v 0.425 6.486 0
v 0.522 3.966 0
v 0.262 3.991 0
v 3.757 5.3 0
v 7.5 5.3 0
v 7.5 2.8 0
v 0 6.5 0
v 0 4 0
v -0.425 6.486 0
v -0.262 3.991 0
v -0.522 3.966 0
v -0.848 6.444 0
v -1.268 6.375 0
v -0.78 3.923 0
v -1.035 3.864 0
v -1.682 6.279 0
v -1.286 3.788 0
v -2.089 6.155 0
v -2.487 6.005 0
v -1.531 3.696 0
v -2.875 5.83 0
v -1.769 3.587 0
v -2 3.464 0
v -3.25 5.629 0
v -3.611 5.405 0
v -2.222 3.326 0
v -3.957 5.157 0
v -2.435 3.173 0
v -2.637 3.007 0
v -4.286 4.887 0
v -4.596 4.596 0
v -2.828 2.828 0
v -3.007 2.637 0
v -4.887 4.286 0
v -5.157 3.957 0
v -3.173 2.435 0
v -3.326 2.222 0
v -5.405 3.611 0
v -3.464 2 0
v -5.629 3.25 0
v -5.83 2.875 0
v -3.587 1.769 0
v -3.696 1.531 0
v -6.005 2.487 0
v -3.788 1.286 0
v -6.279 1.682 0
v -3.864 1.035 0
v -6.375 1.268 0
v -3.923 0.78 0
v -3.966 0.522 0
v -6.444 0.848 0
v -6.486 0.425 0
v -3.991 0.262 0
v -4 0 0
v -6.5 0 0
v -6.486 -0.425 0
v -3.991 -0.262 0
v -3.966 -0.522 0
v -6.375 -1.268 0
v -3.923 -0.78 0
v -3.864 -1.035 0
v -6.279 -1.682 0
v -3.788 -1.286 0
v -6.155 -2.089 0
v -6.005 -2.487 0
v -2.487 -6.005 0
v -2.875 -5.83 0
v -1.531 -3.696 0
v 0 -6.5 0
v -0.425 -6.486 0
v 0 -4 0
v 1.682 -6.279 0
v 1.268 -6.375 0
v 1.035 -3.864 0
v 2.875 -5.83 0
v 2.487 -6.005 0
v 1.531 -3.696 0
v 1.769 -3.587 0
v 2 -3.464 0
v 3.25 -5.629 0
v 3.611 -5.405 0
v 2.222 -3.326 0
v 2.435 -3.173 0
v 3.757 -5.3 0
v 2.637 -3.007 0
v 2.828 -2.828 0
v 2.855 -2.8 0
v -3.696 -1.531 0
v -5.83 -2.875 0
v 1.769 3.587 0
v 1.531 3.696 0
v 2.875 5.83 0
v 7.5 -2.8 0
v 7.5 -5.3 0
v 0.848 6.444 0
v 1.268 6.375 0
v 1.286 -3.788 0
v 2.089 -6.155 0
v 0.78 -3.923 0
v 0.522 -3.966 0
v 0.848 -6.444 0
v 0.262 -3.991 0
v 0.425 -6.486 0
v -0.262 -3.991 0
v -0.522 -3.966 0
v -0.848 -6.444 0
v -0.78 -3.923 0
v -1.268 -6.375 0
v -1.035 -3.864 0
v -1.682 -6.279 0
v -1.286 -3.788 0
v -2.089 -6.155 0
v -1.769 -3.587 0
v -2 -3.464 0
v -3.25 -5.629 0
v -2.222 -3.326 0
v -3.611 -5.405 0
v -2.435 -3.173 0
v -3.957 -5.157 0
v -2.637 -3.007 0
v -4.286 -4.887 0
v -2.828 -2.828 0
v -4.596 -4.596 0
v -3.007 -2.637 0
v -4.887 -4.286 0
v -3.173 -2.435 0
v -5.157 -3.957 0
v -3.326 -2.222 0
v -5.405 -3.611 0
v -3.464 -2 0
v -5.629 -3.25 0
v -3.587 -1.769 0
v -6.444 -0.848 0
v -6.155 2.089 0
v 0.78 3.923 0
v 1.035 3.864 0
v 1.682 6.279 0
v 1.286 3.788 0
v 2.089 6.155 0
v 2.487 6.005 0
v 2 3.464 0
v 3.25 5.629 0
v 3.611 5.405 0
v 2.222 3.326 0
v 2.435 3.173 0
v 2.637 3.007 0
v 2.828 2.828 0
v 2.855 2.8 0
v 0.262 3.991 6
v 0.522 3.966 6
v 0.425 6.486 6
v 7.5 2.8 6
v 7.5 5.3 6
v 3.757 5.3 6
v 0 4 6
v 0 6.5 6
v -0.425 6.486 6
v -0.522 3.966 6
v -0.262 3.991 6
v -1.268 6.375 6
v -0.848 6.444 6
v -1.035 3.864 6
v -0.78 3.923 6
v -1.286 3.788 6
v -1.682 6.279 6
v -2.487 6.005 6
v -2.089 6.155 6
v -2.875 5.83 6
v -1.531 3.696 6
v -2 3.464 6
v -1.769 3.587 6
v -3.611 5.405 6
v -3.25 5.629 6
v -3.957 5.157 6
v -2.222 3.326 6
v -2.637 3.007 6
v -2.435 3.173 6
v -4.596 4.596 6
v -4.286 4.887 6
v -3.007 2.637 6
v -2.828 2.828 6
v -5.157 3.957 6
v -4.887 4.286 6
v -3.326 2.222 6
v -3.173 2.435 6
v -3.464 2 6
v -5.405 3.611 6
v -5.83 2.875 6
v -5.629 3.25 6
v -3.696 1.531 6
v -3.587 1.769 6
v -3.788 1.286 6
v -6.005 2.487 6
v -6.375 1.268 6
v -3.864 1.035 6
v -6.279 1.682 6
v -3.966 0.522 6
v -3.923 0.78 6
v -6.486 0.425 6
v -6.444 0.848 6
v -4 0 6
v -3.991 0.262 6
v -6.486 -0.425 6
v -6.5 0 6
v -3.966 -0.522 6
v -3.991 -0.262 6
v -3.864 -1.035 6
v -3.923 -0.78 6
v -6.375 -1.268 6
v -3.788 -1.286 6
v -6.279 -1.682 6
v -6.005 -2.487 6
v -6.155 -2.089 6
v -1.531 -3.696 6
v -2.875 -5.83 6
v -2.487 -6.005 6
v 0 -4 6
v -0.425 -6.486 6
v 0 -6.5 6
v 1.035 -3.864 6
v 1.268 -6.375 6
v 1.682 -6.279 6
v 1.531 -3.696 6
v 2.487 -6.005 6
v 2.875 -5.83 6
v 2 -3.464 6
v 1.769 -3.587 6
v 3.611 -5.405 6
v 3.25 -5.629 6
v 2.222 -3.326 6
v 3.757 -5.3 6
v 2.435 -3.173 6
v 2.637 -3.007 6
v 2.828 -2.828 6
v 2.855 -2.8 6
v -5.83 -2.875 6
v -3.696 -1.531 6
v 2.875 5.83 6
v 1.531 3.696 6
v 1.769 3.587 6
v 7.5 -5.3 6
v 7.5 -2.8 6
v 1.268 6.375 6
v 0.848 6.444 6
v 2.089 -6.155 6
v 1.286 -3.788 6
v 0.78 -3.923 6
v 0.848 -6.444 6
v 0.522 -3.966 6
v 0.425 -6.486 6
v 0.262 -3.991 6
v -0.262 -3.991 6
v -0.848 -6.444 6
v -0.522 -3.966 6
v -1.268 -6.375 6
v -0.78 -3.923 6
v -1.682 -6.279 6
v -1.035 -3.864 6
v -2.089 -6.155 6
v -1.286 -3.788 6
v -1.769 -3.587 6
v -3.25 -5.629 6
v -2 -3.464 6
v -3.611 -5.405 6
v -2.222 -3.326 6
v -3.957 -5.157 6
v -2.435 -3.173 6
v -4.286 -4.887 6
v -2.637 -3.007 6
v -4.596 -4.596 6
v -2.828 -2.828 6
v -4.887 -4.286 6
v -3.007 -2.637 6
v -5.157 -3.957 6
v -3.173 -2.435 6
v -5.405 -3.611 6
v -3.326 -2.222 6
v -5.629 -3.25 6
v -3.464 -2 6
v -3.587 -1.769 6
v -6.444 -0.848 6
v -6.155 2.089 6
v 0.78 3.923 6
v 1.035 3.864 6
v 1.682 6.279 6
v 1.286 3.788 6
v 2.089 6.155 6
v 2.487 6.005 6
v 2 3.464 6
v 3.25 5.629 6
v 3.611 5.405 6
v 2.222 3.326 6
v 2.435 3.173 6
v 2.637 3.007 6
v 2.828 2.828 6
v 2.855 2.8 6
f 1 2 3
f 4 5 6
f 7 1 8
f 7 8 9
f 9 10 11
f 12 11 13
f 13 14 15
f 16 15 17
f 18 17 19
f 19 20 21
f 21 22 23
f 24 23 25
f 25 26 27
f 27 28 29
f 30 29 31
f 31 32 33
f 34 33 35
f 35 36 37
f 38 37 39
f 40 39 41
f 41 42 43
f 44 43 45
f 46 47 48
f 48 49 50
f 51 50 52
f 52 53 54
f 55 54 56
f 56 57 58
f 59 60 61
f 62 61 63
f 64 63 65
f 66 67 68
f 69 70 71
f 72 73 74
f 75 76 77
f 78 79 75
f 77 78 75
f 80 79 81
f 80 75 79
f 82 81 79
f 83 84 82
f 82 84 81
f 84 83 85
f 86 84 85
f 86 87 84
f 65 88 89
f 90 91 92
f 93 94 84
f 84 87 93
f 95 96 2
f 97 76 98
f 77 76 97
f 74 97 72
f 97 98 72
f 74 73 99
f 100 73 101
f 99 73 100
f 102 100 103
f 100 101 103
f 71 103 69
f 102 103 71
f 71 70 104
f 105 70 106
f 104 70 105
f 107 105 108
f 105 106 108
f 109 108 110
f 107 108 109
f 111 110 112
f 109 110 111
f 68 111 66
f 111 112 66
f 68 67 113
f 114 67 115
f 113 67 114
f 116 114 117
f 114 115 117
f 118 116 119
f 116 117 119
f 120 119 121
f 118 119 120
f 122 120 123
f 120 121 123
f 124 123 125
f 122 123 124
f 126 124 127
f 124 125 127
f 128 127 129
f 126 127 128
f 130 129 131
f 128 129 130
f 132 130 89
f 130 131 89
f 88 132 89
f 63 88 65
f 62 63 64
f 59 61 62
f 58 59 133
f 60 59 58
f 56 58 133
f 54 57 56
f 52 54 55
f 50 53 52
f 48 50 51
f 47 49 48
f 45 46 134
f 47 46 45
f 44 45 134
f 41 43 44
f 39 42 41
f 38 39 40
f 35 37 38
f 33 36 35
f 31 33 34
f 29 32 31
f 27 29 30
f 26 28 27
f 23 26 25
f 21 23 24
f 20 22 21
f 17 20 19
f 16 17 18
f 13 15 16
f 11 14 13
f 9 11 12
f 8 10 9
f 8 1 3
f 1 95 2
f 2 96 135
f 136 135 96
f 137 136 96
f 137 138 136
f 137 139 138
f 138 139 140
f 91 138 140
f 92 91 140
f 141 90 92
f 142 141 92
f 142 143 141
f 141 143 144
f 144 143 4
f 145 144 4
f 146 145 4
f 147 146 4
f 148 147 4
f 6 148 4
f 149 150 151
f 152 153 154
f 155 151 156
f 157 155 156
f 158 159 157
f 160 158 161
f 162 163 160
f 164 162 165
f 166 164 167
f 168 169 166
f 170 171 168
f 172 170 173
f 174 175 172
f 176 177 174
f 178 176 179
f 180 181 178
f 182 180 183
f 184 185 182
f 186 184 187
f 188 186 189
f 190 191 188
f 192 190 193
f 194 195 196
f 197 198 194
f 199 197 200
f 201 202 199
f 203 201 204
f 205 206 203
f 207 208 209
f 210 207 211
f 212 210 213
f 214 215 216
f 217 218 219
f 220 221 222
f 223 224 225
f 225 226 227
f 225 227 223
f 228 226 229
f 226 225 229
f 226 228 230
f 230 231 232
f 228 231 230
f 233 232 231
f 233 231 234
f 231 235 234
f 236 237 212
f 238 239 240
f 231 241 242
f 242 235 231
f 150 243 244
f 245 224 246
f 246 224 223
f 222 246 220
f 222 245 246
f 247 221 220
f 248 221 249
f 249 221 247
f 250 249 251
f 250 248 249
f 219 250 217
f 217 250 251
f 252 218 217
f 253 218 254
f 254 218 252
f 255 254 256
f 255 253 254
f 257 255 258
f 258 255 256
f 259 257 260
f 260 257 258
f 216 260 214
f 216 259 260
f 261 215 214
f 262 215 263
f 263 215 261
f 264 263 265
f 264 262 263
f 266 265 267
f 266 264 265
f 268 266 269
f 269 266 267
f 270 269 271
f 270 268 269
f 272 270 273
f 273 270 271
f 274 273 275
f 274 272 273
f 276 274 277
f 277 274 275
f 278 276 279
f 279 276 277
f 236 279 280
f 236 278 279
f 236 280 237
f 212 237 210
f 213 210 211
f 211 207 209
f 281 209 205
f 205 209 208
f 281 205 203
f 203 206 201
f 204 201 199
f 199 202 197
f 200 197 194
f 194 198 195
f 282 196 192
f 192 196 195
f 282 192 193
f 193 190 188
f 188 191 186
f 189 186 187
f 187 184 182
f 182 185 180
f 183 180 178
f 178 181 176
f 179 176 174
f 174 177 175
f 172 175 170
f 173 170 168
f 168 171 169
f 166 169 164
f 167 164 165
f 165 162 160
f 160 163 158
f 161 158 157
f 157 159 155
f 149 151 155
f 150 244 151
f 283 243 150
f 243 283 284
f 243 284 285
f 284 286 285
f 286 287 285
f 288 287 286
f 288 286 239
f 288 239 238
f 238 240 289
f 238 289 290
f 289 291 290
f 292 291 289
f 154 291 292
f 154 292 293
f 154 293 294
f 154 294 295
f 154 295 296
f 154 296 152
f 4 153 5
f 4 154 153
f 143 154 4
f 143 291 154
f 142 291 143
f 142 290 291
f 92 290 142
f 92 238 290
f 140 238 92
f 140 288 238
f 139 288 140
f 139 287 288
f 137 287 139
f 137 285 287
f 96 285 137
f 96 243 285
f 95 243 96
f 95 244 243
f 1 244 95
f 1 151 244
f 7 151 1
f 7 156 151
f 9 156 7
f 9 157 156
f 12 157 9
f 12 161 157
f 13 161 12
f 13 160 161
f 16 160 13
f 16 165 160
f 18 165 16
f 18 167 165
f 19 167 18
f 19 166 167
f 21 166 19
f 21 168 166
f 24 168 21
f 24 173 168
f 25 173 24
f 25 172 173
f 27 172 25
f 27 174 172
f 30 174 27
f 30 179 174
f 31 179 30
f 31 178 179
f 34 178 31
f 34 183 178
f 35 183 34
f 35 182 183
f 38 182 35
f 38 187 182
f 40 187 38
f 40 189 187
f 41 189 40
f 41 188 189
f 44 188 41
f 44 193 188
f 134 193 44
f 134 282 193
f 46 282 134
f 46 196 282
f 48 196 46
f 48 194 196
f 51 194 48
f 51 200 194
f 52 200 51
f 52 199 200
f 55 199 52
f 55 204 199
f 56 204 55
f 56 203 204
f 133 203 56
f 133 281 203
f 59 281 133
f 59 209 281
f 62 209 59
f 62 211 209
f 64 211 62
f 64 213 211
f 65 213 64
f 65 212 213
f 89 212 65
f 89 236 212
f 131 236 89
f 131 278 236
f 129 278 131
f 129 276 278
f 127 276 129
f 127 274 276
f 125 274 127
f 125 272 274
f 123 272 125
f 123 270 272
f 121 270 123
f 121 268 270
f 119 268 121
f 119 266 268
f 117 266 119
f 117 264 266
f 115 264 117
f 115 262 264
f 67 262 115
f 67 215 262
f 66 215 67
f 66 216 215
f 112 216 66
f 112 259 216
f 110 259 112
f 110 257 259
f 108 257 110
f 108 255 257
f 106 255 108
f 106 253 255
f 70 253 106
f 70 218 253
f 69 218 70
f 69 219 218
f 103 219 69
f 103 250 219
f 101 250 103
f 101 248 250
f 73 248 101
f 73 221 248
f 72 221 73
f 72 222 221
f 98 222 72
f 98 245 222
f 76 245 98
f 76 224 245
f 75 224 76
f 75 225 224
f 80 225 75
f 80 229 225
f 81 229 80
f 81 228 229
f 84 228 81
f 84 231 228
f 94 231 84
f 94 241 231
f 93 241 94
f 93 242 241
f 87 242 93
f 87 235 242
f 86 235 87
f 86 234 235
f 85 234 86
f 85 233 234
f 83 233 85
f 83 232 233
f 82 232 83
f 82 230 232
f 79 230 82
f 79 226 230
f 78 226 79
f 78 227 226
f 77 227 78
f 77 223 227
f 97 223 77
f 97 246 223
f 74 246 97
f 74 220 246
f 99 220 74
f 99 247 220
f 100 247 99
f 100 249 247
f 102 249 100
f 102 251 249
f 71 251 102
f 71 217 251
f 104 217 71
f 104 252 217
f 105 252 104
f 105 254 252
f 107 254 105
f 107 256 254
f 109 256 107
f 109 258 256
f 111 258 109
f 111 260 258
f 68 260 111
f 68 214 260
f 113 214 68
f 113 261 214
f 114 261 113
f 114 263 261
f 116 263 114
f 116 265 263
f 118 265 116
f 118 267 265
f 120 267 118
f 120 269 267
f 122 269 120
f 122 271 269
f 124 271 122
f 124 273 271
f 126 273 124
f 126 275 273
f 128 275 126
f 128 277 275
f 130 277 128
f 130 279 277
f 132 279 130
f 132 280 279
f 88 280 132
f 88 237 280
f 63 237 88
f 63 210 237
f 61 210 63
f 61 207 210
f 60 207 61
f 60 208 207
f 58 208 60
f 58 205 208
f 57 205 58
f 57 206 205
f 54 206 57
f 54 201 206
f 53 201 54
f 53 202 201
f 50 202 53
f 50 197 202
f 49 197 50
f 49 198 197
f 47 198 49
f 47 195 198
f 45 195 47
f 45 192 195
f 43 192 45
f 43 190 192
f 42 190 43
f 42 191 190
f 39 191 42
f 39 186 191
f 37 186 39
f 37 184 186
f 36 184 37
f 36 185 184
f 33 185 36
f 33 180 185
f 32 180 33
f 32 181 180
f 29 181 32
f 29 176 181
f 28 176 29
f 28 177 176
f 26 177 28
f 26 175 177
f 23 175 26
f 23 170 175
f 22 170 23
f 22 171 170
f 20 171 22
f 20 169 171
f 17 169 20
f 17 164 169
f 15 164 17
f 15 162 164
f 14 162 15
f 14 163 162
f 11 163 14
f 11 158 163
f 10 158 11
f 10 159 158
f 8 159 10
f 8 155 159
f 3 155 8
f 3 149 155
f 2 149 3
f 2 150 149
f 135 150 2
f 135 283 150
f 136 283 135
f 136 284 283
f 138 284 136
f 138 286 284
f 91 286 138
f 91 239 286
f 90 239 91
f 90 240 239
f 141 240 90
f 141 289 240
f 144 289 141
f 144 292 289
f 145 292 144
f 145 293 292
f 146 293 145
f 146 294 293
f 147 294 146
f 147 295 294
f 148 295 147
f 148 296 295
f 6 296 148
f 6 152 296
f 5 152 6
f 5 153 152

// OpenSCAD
// rod_clip — snap-on C-clip that stops the rod walking out of the brackets.
// Print FOUR (two per rod: one outboard of each bracket).
//
// THE PROBLEM IT SOLVES: `rod_bracket`'s bore is a plain through-hole, so the rod
// is free to slide ALONG its own axis until it clears one bracket. Nothing in the
// bracket ever stopped that.
//
// WHY A CLIP ON THE ROD RATHER THAN A CHANGE TO THE BRACKET: the brackets are
// already printed and on the shelf. Anything that needs a feature on them means
// reprinting two 71 g parts to fix a 1 g problem.
//
// HOW YOU USE IT:
//   Push one onto the rod just OUTBOARD of each bracket, snapped up against the
//   bracket's outer face. The rod can then only travel until a clip hits a
//   bracket, which is nowhere. To pull a reel off, pop one clip and slide the rod.
//
// ⚠️ THE GRIP IS A PRINTED FIT AND HAS NOT BEEN CALIBRATED. `CLIP_ID` is 8.0
// against an 8.0 rod, which relies on holes printing slightly undersize to give
// the interference. If it slides on too loosely, drop it: `-D CLIP_ID=7.8`. If it
// will not go on, raise it. That is one 1 g reprint, not a gauge.
//
// PRINT: flat, as emitted. The C then flexes IN the layer plane when you snap it
// on, rather than trying to peel layers apart. No supports.
//
// SPDX-License-Identifier: CC-BY-NC-4.0
// Copyright (c) 2026 Aaron Cupp

/* [Rod] */
ROD_D   = 8.0;    // [3:0.5:16] matches rod_bracket

/* [Clip] */
CLIP_ID    = 8.0;   // [6:0.1:16] bore. Nominal on purpose — see the note above
CLIP_WALL  = 2.5;   // [1.5:0.1:5] ring thickness
CLIP_W     = 6.0;   // [3:0.5:12] width along the rod
MOUTH      = 5.6;   // [3:0.2:10] opening. MUST be under CLIP_ID or it will not
                    //   stay on: the clip has to spring over the rod's widest
                    //   point and close again behind it
EAR        = 4.0;   // [0:0.5:8] finger tabs either side of the mouth, to pop it
                    //   off without a tool. 0 removes them
$fn = 96;

OD = CLIP_ID + 2*CLIP_WALL;

assert(MOUTH < CLIP_ID, "Mouth must be narrower than the bore or the clip falls off.");
assert(CLIP_WALL >= 1.5, "Ring too thin to spring without snapping.");
echo(str("clip ", OD, " od x ", CLIP_W, " wide, bore ", CLIP_ID,
         ", mouth ", MOUTH, " -> springs ", CLIP_ID - MOUTH, " mm to go on"));

linear_extrude(CLIP_W) {
    difference() {
        union() {
            circle(d = OD);
            // finger ears, so it can be popped off by hand
            if (EAR > 0)
                for (s = [-1, 1])
                    translate([OD/2 - 1, s*(MOUTH/2 + CLIP_WALL/2)])
                        square([EAR, CLIP_WALL], center = true);
        }
        circle(d = CLIP_ID);
        // the mouth, opening to +X
        translate([0, -MOUTH/2]) square([OD/2 + EAR + 1, MOUTH]);
    }
}
